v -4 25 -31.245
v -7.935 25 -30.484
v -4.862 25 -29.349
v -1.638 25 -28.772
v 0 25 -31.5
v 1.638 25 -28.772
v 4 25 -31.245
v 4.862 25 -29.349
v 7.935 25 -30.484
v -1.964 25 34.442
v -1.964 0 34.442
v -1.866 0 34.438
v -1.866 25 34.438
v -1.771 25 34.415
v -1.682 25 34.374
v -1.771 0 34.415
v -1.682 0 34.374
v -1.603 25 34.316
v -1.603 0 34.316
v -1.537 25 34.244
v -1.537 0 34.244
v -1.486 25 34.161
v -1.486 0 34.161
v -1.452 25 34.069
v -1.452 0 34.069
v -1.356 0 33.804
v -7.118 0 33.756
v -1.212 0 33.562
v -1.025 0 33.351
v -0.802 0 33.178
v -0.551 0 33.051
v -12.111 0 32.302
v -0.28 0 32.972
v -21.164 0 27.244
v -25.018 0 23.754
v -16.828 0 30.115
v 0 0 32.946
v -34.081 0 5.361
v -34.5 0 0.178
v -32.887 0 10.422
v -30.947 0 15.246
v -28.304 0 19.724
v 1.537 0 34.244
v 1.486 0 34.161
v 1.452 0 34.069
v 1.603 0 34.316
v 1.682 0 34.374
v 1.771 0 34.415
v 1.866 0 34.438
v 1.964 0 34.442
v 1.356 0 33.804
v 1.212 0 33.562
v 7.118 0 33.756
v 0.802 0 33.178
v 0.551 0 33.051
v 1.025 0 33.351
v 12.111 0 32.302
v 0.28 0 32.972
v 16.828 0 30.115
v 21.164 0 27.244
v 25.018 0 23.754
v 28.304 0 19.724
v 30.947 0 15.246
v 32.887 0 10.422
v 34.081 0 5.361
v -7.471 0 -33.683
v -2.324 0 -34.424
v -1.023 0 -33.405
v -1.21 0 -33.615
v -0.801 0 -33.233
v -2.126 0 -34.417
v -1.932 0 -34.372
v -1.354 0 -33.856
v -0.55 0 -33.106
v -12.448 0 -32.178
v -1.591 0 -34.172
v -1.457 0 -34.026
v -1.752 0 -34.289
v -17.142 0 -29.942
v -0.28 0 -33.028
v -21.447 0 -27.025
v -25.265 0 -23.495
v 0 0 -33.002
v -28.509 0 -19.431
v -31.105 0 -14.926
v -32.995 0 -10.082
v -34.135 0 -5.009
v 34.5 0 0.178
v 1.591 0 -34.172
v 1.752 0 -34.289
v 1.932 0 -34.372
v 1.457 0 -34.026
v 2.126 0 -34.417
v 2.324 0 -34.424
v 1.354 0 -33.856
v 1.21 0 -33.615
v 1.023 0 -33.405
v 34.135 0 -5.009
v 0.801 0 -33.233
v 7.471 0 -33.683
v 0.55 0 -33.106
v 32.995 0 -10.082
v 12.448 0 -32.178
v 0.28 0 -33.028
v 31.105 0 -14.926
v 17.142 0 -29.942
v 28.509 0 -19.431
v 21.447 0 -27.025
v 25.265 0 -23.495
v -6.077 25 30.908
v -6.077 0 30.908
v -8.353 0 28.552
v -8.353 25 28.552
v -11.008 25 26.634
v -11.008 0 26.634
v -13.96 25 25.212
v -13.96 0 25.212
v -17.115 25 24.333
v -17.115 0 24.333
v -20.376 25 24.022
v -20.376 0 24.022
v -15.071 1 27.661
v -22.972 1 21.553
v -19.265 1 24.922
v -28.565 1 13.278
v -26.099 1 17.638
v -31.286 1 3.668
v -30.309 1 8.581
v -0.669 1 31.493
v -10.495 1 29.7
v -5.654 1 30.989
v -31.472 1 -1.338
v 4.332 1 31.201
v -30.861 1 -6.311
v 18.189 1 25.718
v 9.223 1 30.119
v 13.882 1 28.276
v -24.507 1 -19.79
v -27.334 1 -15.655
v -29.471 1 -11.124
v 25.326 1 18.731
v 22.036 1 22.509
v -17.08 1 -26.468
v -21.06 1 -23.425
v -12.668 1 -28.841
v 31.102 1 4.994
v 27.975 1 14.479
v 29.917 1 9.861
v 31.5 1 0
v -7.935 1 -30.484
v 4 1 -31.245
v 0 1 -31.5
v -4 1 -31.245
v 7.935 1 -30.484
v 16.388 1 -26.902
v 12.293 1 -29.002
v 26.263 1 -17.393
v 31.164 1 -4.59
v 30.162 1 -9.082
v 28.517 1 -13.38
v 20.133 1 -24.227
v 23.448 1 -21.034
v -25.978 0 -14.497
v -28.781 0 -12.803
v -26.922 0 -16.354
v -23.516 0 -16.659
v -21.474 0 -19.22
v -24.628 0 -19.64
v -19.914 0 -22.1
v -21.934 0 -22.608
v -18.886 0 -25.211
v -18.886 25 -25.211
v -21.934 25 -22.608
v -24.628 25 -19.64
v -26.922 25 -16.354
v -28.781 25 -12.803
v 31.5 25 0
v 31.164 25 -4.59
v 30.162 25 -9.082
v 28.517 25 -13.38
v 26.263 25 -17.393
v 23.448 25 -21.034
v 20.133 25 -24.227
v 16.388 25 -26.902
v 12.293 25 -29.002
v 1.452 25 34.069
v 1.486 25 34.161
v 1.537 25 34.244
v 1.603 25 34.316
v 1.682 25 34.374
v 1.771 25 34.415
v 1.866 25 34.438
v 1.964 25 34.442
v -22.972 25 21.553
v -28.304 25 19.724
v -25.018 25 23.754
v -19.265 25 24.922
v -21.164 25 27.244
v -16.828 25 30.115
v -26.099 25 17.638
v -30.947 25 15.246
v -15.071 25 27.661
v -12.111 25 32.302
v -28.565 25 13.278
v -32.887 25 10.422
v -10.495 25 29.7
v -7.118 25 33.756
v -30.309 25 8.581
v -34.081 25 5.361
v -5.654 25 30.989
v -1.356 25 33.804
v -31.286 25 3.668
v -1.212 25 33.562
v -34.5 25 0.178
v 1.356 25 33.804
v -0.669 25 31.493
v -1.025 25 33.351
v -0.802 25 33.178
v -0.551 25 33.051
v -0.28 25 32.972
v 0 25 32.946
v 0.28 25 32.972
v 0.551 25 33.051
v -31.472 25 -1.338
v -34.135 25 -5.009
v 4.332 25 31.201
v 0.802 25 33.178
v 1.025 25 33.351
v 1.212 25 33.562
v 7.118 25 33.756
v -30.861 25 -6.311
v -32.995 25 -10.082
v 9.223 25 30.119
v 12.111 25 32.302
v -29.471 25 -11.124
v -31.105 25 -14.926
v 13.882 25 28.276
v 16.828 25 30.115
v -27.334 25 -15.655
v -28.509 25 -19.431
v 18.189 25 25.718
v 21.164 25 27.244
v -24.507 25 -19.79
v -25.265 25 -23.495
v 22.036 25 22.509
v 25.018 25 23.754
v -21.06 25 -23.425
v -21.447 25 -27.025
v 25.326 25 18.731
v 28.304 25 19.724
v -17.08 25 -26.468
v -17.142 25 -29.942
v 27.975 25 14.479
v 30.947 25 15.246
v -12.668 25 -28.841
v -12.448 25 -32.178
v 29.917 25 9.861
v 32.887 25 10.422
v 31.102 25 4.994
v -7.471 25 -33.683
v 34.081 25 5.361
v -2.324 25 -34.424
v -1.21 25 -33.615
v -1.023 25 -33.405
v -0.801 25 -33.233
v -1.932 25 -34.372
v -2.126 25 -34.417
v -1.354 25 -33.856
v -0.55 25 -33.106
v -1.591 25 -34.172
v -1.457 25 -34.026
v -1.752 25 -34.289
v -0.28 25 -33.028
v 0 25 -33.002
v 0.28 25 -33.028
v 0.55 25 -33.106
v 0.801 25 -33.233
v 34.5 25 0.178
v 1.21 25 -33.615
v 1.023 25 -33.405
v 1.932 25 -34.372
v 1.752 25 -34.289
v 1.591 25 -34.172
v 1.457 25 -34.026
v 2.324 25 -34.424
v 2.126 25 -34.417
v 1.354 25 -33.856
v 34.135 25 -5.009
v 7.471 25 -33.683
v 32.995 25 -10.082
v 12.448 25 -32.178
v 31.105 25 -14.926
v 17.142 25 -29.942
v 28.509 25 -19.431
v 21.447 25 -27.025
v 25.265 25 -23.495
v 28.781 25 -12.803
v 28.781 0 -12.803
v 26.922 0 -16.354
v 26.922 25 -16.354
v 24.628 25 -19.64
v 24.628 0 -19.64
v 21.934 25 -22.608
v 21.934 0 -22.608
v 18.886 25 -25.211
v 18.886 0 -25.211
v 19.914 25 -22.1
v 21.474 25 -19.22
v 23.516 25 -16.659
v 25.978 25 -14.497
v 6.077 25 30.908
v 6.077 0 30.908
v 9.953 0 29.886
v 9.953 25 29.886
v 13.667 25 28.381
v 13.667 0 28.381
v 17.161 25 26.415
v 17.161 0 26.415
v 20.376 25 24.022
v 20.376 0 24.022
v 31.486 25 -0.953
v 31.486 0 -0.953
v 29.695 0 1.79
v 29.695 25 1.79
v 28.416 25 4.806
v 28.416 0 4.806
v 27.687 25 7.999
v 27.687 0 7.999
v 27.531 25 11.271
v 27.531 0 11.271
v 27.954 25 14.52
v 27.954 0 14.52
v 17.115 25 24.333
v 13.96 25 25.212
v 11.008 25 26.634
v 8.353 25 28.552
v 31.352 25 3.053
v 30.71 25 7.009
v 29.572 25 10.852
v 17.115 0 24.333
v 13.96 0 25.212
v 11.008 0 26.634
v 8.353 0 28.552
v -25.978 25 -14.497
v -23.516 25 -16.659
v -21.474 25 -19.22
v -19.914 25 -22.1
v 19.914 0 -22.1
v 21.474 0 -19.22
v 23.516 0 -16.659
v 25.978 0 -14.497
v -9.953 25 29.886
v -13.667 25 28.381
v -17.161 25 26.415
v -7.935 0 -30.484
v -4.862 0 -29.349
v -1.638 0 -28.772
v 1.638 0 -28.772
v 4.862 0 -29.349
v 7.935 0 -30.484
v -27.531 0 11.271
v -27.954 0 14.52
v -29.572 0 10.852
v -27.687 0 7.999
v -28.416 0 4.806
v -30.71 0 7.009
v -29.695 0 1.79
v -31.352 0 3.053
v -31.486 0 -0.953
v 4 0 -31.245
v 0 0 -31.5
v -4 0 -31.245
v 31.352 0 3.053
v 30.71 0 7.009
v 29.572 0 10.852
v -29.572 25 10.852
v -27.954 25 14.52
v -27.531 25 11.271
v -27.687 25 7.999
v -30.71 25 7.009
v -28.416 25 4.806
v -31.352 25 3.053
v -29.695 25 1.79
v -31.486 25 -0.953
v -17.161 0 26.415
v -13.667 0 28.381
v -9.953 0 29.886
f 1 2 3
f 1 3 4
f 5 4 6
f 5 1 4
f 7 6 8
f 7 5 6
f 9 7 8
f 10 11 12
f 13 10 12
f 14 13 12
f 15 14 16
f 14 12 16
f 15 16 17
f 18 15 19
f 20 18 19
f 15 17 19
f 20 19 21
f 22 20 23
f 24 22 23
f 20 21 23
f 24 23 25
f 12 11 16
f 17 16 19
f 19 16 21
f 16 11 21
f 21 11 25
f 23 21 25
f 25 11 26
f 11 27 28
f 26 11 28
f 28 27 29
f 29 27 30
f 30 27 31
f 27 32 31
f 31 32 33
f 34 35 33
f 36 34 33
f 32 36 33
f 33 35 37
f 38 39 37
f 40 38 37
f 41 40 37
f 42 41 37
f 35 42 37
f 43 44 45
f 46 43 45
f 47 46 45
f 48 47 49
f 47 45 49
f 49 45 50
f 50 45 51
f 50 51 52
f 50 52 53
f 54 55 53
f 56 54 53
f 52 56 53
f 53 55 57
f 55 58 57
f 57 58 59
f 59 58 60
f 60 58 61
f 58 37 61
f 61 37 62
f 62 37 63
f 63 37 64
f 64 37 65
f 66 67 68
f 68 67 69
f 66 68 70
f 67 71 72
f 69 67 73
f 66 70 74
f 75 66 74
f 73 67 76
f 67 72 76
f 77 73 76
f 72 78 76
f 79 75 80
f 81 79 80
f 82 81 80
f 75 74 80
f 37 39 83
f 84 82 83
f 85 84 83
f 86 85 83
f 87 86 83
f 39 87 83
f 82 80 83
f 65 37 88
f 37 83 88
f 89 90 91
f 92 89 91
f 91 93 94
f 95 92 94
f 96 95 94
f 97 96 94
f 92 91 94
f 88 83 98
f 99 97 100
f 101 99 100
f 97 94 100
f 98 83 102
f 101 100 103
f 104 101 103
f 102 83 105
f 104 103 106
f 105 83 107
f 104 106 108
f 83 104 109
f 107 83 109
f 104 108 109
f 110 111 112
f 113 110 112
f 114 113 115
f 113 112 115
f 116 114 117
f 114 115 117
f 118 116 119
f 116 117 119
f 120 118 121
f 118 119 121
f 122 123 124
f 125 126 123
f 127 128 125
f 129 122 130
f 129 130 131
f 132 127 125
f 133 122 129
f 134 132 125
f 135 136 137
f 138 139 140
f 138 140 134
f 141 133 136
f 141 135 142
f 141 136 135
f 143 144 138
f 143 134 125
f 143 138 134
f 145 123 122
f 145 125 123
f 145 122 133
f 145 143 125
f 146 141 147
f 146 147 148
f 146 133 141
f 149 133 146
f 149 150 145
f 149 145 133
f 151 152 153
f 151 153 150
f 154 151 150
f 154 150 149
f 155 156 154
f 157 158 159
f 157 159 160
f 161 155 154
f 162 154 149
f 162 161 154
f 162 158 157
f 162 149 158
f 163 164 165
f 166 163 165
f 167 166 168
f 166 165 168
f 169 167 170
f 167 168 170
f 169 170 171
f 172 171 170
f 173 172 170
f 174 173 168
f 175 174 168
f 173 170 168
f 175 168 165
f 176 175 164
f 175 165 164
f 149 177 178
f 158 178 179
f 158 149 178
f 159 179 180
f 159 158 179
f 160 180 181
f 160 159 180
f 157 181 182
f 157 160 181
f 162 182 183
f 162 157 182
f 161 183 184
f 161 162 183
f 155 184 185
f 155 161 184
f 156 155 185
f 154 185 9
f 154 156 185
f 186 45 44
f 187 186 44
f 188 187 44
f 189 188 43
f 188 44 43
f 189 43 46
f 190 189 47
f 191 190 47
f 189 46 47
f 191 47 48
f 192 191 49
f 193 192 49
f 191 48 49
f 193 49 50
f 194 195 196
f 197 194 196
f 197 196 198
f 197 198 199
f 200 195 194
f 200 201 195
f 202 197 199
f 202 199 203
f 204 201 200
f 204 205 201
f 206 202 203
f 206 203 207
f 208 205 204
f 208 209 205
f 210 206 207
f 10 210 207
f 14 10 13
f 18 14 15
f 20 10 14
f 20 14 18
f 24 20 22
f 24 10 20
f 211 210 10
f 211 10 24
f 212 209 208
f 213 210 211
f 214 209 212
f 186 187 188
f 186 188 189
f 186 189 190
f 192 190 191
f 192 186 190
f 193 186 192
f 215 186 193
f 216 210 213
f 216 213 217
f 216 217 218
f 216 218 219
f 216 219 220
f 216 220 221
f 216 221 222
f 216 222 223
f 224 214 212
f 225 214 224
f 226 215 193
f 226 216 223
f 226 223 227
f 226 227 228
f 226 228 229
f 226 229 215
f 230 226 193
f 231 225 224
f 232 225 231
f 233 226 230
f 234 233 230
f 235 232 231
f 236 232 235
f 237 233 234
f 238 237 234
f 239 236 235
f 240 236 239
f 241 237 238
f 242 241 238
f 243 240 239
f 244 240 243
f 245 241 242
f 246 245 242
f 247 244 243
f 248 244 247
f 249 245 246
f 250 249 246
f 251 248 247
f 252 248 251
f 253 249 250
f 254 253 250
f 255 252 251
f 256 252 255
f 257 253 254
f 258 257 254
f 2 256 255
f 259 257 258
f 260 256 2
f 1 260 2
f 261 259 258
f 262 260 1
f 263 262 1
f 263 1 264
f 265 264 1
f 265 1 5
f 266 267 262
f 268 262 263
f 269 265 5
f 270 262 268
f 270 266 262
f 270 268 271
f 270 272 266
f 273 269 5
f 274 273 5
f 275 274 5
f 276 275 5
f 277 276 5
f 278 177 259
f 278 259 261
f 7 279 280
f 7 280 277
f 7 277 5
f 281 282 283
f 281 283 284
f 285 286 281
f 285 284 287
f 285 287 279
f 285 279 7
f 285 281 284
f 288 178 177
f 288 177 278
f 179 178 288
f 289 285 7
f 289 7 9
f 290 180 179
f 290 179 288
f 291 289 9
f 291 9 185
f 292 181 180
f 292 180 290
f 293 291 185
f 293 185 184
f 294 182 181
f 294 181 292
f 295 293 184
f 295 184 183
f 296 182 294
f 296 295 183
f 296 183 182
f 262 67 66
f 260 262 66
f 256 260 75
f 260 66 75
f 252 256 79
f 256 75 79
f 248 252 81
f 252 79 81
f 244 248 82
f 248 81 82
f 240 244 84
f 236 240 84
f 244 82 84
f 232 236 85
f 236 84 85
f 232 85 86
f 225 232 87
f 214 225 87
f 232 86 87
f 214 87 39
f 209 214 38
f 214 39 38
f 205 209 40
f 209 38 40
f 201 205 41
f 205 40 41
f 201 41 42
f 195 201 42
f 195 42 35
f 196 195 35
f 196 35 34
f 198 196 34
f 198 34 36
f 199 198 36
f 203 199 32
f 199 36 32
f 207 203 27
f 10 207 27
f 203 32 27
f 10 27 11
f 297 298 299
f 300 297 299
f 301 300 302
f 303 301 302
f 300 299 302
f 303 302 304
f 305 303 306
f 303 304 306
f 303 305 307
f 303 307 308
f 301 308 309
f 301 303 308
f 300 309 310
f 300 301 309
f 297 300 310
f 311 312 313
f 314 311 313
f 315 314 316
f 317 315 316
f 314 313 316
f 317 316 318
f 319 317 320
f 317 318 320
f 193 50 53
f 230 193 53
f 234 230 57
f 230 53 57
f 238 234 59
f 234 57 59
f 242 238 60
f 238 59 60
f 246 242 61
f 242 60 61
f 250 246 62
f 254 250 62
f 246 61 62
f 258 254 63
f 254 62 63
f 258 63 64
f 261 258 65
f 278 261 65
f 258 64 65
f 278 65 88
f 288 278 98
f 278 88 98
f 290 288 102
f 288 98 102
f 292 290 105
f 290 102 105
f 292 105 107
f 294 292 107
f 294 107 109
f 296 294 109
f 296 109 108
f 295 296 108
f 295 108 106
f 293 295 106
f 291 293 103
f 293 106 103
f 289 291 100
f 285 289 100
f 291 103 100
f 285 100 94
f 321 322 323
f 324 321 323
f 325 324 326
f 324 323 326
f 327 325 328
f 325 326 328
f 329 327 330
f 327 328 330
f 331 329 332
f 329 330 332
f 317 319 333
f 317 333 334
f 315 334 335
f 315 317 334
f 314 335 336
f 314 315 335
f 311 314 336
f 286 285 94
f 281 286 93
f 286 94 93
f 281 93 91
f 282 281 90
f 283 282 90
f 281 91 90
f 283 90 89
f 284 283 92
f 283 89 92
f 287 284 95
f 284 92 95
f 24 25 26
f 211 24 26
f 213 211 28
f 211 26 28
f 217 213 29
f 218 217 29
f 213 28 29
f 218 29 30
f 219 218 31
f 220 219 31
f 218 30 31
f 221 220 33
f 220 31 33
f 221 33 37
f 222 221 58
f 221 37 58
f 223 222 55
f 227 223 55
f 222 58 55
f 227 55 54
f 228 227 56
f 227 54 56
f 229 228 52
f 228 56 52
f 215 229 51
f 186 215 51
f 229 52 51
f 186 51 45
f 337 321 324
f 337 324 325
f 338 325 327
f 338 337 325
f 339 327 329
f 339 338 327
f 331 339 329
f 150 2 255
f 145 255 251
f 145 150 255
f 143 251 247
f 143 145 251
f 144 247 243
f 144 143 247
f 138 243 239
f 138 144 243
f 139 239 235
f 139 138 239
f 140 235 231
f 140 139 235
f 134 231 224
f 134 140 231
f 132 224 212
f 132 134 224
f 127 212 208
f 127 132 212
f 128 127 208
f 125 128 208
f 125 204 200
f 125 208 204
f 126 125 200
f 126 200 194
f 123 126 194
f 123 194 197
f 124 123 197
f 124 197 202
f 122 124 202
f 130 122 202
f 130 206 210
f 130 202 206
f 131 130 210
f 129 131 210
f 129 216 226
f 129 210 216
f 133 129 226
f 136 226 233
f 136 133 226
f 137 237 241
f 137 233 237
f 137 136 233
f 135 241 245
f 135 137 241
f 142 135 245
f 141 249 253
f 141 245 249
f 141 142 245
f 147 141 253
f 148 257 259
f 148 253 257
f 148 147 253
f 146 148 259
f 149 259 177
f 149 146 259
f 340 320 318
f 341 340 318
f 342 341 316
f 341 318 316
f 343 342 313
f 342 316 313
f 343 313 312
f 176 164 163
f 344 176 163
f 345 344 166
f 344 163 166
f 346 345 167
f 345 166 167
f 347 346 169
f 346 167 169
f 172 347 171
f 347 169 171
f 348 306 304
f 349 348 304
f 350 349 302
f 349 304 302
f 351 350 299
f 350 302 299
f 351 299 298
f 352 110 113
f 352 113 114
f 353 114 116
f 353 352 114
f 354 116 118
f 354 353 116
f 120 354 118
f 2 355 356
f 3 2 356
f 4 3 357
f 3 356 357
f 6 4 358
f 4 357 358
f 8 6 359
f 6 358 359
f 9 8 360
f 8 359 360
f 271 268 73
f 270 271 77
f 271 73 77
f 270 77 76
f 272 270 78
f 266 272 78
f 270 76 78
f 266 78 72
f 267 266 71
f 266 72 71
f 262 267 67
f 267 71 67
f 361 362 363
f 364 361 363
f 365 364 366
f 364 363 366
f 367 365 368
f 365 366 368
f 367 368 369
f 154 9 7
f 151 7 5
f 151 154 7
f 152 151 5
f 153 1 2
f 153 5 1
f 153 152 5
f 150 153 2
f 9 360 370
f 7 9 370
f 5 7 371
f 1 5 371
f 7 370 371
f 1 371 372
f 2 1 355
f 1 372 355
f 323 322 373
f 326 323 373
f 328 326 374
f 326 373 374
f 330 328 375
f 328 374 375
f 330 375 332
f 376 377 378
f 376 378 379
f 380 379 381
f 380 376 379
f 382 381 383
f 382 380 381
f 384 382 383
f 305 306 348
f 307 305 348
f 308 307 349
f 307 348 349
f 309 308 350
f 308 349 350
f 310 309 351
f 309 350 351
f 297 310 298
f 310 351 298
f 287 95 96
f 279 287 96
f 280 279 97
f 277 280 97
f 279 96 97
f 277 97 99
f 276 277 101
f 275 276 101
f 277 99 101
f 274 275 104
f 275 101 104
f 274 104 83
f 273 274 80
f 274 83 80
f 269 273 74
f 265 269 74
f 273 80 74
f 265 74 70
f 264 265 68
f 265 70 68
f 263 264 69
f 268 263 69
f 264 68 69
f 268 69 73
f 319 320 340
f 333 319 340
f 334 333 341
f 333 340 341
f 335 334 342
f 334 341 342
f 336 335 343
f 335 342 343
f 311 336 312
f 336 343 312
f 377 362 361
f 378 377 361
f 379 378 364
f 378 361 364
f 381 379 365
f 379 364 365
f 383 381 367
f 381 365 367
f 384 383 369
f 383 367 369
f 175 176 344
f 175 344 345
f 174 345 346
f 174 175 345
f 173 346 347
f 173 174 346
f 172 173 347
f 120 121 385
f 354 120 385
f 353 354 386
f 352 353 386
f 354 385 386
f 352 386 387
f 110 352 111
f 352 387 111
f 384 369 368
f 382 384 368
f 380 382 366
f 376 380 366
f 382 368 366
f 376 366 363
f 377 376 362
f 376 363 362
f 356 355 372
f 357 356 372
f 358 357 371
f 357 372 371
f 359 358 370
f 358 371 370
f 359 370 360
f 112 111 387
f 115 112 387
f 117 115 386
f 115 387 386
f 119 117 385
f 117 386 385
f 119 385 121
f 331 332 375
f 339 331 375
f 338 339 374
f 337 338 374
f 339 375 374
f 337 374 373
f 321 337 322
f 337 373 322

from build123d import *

# Parameters (mm, degrees)
BOSS_EXTRUDE1_DEPTH = 25
CUT_EXTRUDE2_REACH  = 28
CUT_EXTRUDE2_START  = 1
BOSS_EXTRUDE2_DEPTH = 25
CIRPATTERN2_COUNT   = 7


with BuildPart() as part:
    # Sketch1 → Boss-Extrude1 (new body)
    with BuildSketch(Plane(origin=(0, 0, 0), x_dir=(1, 0, 0), z_dir=(0, 1, 0))):
        with BuildLine():
            ThreePointArc((1.451818925, -34.068556857), (1.641248992, -34.346908706), (1.964225605, -34.442038138))
            ThreePointArc((1.964225605, -34.442038138), (34.499528846, -0.178302888), (2.324135821, 34.423627607))
            ThreePointArc((2.324135821, 34.423627607), (1.751838249, 34.289058819), (1.354061739, 33.856153382))
            ThreePointArc((1.354061739, 33.856153382), (0, 33.001534515), (-1.354061739, 33.856153382))
            ThreePointArc((-1.354061739, 33.856153382), (-1.751838249, 34.289058819), (-2.324135821, 34.423627607))
            ThreePointArc((-2.324135821, 34.423627607), (-34.499528846, -0.178302888), (-1.964225605, -34.442038138))
            ThreePointArc((-1.964225605, -34.442038138), (-1.641248992, -34.346908706), (-1.451818925, -34.068556857))
            ThreePointArc((-1.451818925, -34.068556857), (0, -32.945679925), (1.451818925, -34.068556857))
        make_face()
    extrude(amount=BOSS_EXTRUDE1_DEPTH)

    # Sketch2 → Cut-Extrude2 (cut, up to next)
    with BuildSketch(Plane(origin=(0, 0, 0), x_dir=(1, 0, 0), z_dir=(0, 1, 0)).offset(CUT_EXTRUDE2_START), mode=Mode.PRIVATE) as cut_extrude2_sk1:
        with BuildLine():
            ThreePointArc((-7.935237994, 30.484126984), (-19.265123971, -24.92197822), (31.5, 0))
            ThreePointArc((31.5, 0), (24.92197822, 19.265123971), (7.935237994, 30.484126984))
            ThreePointArc((7.935237994, 30.484126984), (0, 28.7), (-7.935237994, 30.484126984))
        make_face()
    cut_extrude2_tool1 = extrude(cut_extrude2_sk1.sketch, amount=CUT_EXTRUDE2_REACH, mode=Mode.PRIVATE) & part.part
    add(cut_extrude2_tool1.solids().sort_by_distance((0, 1, 0.291722))[0], mode=Mode.SUBTRACT)
    # Sketch2 → Cut-Extrude2 (cut, up to next)
    with BuildSketch(Plane(origin=(0, 0, 0), x_dir=(1, 0, 0), z_dir=(0, 1, 0)).offset(CUT_EXTRUDE2_START), mode=Mode.PRIVATE) as cut_extrude2_sk2:
        with BuildLine():
            ThreePointArc((-7.935237994, 30.484126984), (0, 28.7), (7.935237994, 30.484126984))
            ThreePointArc((7.935237994, 30.484126984), (0, 31.5), (-7.935237994, 30.484126984))
        make_face()
    cut_extrude2_tool2 = extrude(cut_extrude2_sk2.sketch, amount=CUT_EXTRUDE2_REACH, mode=Mode.PRIVATE) & part.part
    add(cut_extrude2_tool2.solids().sort_by_distance((0, 1, -30.173357))[0], mode=Mode.SUBTRACT)


with BuildPart() as body_2:
    # Sketch2<2> → Boss-Extrude2 (new body)
    with BuildSketch(Plane(origin=(0, 0, 0), x_dir=(1, 0, 0), z_dir=(0, 1, 0))):
        with BuildLine():
            ThreePointArc((-7.935237994, 30.484126984), (0, 28.7), (7.935237994, 30.484126984))
            ThreePointArc((7.935237994, 30.484126984), (0, 31.5), (-7.935237994, 30.484126984))
        make_face()
    extrude(amount=BOSS_EXTRUDE2_DEPTH)


with BuildPart() as cirpattern2_1:
    # CirPattern2: pattern copy
    add(body_2.part.rotate(Axis((0, 0, 0), (0, 1, 0)), 1 * 360 / CIRPATTERN2_COUNT))


with BuildPart() as cirpattern2_2:
    # CirPattern2: pattern copy
    add(body_2.part.rotate(Axis((0, 0, 0), (0, 1, 0)), 2 * 360 / CIRPATTERN2_COUNT))


with BuildPart() as cirpattern2_3:
    # CirPattern2: pattern copy
    add(body_2.part.rotate(Axis((0, 0, 0), (0, 1, 0)), 3 * 360 / CIRPATTERN2_COUNT))


with BuildPart() as cirpattern2_4:
    # CirPattern2: pattern copy
    add(body_2.part.rotate(Axis((0, 0, 0), (0, 1, 0)), 4 * 360 / CIRPATTERN2_COUNT))


with BuildPart() as cirpattern2_5:
    # CirPattern2: pattern copy
    add(body_2.part.rotate(Axis((0, 0, 0), (0, 1, 0)), 5 * 360 / CIRPATTERN2_COUNT))


with BuildPart() as cirpattern2_6:
    # CirPattern2: pattern copy
    add(body_2.part.rotate(Axis((0, 0, 0), (0, 1, 0)), 6 * 360 / CIRPATTERN2_COUNT))


solid = Compound([part.part, body_2.part, cirpattern2_1.part, cirpattern2_2.part, cirpattern2_3.part, cirpattern2_4.part, cirpattern2_5.part, cirpattern2_6.part])
